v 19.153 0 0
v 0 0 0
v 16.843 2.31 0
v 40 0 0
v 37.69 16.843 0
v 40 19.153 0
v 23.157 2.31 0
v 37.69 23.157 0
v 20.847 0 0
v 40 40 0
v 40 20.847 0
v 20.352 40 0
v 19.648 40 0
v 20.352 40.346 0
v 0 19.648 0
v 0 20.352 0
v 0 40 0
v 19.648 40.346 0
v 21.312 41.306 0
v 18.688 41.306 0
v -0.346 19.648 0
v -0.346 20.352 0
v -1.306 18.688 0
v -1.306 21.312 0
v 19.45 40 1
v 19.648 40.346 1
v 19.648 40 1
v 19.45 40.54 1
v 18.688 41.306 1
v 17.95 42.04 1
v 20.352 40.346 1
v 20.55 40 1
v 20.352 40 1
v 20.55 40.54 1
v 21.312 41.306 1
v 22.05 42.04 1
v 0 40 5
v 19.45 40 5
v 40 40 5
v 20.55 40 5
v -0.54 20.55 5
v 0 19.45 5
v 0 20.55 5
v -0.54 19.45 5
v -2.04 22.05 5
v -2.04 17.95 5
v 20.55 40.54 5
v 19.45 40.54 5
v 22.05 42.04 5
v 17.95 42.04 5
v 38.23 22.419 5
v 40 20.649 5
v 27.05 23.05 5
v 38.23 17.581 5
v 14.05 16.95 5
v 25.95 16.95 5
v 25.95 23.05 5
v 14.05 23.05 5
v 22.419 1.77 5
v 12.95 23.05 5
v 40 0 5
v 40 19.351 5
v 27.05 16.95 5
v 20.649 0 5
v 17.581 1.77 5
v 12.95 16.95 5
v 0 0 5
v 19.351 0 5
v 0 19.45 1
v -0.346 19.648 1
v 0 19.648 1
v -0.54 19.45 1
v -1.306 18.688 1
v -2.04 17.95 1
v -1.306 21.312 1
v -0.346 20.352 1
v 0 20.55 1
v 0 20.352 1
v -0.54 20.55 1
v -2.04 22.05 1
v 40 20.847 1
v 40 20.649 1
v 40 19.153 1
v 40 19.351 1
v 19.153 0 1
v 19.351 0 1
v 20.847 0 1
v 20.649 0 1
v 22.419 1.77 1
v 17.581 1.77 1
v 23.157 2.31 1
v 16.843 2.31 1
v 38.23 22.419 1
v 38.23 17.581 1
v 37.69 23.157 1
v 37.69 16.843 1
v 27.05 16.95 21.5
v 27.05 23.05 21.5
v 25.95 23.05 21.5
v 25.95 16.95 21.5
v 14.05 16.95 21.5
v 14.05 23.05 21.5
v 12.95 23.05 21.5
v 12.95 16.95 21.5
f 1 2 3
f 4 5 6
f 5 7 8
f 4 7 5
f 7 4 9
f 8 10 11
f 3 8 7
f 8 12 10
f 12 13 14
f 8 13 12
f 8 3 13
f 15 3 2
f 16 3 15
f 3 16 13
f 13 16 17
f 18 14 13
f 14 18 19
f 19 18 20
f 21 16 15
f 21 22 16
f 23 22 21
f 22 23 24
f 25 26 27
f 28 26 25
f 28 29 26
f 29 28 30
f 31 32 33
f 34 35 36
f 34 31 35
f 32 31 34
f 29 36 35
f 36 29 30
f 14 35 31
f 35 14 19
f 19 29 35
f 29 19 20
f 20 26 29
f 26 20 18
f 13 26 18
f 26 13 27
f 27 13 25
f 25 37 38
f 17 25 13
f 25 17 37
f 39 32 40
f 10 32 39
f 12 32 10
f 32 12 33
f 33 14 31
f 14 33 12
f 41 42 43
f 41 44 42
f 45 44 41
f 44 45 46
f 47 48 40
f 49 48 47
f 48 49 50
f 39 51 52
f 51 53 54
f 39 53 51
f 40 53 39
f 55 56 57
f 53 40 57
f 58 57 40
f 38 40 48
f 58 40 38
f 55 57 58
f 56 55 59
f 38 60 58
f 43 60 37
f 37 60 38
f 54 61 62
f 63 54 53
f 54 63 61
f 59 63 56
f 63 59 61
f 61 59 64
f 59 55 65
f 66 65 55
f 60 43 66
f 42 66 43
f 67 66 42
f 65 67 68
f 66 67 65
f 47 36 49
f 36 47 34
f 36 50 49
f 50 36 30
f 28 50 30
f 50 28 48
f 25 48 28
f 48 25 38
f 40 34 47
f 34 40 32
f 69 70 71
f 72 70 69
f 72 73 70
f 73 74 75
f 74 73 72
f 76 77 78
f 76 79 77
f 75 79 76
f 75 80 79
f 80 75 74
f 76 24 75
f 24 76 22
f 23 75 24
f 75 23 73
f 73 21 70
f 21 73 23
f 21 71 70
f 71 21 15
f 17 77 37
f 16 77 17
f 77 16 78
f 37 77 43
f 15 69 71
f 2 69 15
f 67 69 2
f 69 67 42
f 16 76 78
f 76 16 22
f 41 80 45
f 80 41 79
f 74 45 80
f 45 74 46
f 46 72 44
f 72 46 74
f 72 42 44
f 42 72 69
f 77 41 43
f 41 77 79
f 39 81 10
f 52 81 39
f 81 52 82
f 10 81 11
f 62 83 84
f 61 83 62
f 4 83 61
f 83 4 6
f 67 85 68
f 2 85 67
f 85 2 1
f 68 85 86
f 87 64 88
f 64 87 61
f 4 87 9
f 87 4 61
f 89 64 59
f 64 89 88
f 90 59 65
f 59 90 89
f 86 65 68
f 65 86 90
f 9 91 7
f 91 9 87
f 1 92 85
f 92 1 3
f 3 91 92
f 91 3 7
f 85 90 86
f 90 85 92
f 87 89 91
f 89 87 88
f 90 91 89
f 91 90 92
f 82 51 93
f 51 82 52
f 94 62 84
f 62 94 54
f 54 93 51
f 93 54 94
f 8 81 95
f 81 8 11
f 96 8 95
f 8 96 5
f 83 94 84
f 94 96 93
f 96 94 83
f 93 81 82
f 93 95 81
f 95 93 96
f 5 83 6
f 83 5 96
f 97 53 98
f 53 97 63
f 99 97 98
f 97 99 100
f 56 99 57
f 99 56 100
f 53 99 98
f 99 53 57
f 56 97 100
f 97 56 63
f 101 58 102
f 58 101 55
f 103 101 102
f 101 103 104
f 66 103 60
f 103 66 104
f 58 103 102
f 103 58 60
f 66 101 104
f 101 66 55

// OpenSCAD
// file: interlockingmodule.scad
//this section defines a module for creating a "rounded" bottom to the box, useful when storing small parts
module RoundBottom(width, length, height){    
    translate([0,length,0])rotate([90,0,0])
    linear_extrude(length, center=false)
    
    difference() {
        translate([-width/2,0,0])square([width,height/2],center=false);
        translate([0,height/2,0])resize([width,height]) circle(d=width*10);
    }
}


module interlockingbox(
    //Box Width in units
    BoxWidthUnits = 3,
    //Box Length in units
    BoxLengthUnits = 3,
    //Box Height in mm
    BoxHeight = 120,
    //Box Floor Thickness in mm
    BoxFloor = 2,
    //North Wall open or closed
    NorthWallOpen = 0, // [0:Closed, 1:Open]
    //South Wall open or closed
    SouthWallOpen = 0 // [0:Closed, 1:Open]
)
{
echo(version=version(2.0));
//comments: Version 2 adds anti-"elephant foot" scaling at bottom of dovetail sections
/* [Size] */
//Box unit size in mm. This defines the size of 1 'unit' for your box.
BoxUnits = 40;
BoxWidth = BoxWidthUnits * BoxUnits;
BoxLength = BoxLengthUnits * BoxUnits;
//Box Wall Thickness in mm
BoxWall = 1;
//Fit Factor. Greater factor = looser fit
FitFactor = 0.18;  // [0:0.05:0.4]
//RoundedBottom = "EW"; // [EW:East-West, NS:North-South]
RoundedBottom = ""; // [EW:East-West, NS:North-South]

/* [Walls] */

/* [Dovetail] */
//Dovetail inside length in mm
DTInsideLength = 1.1;
//Dovetail angle in degrees
DTAngle = 45;
//Dovetail width in mm
DTWidth = 1.5;

/* [Hidden] */
//This helps calculate the length of the 'long' side of the dovetail
DTx=tan(DTAngle)*DTWidth;
//This polygon defines the dovetail shape
DTShape = [[0,0],[DTInsideLength/2,0],[DTInsideLength/2+DTx,DTWidth],[-DTInsideLength/2-DTx,DTWidth],[-DTInsideLength/2,0]];



union(){
    //creates and transforms rounded bottom
    if (RoundedBottom=="EW") {
    translate([0,(BoxWidth/2)+BoxWall,BoxFloor])
    rotate([0,0,-90])
    RoundBottom(BoxWidth-DTWidth-(BoxWall),BoxLength-DTWidth-BoxWall,2*(BoxHeight-BoxFloor));
    }

    //creates rounded bottom oriented North-South
    if (RoundedBottom=="NS") {
    translate([(BoxLength/2)-BoxWall,DTWidth+BoxWall/2,BoxFloor])
    rotate([0,0,0])
    RoundBottom(BoxLength-DTWidth-(BoxWall),BoxWidth-DTWidth-BoxWall,2*(BoxHeight-BoxFloor));
    }

    //Creates main box,without round bottom
    difference(){
        
    union(){
        //main box
    cube([BoxLength,BoxWidth,BoxHeight], center=false);

        //male dovetails
    for (i=[1:BoxLengthUnits])
    translate([(i-1)*BoxUnits+(BoxUnits/2),BoxWidth,0])
        //in 2 sections. first section is slightly scaled down to counter "elephant foot"
        union(){
            linear_extrude(height=1, center=false)
                scale([1-(2*FitFactor),1-(2*FitFactor),1])
                union(){        
                    //this adds a slight offset to the male dovetail for a looser fit
                    translate([-DTInsideLength/2,0,0])
                    square([DTInsideLength,DTWidth]);
                    //main dovetail shape
                    translate([0,DTWidth*FitFactor*2,0])
                    polygon(DTShape);
                };
            translate([0,0,1])
            linear_extrude(height=BoxHeight-1, center=false)
                    union(){
                    //this adds a slight offset to the male dovetail for a looser fit
                    translate([-DTInsideLength/2,0,0])
                    square([DTInsideLength,DTWidth]);
                    //main dovetail shape
                    translate([0,DTWidth*FitFactor*2,0])
                    polygon(DTShape);
                    };
        }        

    for (i=[1:BoxWidthUnits])
    translate([0,(i-1)*BoxUnits+(BoxUnits/2),0])
        //in 2 sections. first section is slightly scaled down to counter "elephant foot"
        rotate([0,0,90])
        union(){
            linear_extrude(height=1, center=false)				//1mm high anti-elephant foot section
                scale([1-(2*FitFactor),1-(2*FitFactor),1])
                union(){        
                    //this adds a slight offset to the male dovetail for a looser fit
                    translate([-DTInsideLength/2,0,0])
                    square([DTInsideLength,DTWidth]);
                    //main dovetail shape
                    translate([0,DTWidth*FitFactor*2,0])
                    polygon(DTShape);
                };
            translate([0,0,1])
            linear_extrude(height=BoxHeight-1, center=false)
                union(){
                    //male dovetail offset
                    translate([-DTInsideLength/2,0,0])
                    square([DTInsideLength,DTWidth]);
                    //main dovetail shape
                    translate([0,DTWidth*FitFactor*2,0])
                    polygon(DTShape);
                };
        }
    }
    //female dovetails
    for (i=[1:BoxLengthUnits])
        union(){
            translate([(i-1)*BoxUnits+(BoxUnits/2),0,0])
                scale([1+FitFactor,1+FitFactor,1])
                linear_extrude(height=BoxHeight, center=false)
                polygon(DTShape);
        
            //added a second dovetail cutout at the bottom, scaled up to counter "elephant foot" when printed
            translate([(i-1)*BoxUnits+(BoxUnits/2),0,0])
                scale([1+(3*FitFactor),1+(3*FitFactor),1])
                linear_extrude(height=1, center=false)
                polygon(DTShape);					
        }

    for (i=[1:BoxWidthUnits])
        union(){
            translate([BoxLength,(i-1)*BoxUnits+(BoxUnits/2),0])
                rotate([0,0,90])
                    scale([1+FitFactor,1+FitFactor,1])
                        linear_extrude(height=BoxHeight, center=false)
                            polygon(DTShape);
            //added a second dovetail cutout at the bottom, scaled up to counter "elephant foot" when printed
            translate([BoxLength,(i-1)*BoxUnits+(BoxUnits/2),0])
                rotate([0,0,90])
                    scale([1+(3*FitFactor),1+(3*FitFactor),1])
                        linear_extrude(height=1, center=false)
                            polygon(DTShape);	
        }
    //carves out main box
    translate([BoxWall,DTWidth+BoxWall,BoxFloor])
        cube([BoxLength-(2*BoxWall)-DTWidth, (BoxWidth-(2*BoxWall)-DTWidth), BoxHeight]);

    if (NorthWallOpen)
        translate([-DTWidth*(1+FitFactor+FitFactor),BoxWall+DTWidth,BoxFloor])
            cube([BoxWall+(DTWidth*(1+FitFactor+FitFactor)), (BoxWidth-(2*BoxWall)-DTWidth), BoxHeight]);    

    if (SouthWallOpen)
        translate([BoxLength-(BoxWall)-DTWidth,BoxWall+DTWidth,BoxFloor])
            cube([BoxWall+DTWidth, (BoxWidth-(2*BoxWall)-DTWidth), BoxHeight]);

    }
  }
}

// Cutout to make sure the actual box with groves is properly printed
// Use this with difference() to remove trim internal to fit the box.
module negativeBox(
    //Box Width in units
    BoxWidthUnits = 3,
    //Box Length in units
    BoxLengthUnits = 3,
    //Box Height in mm
    BoxHeight = 120,
    //Box unit size in mm. This defines the size of 1 'unit' for your box.
    BoxUnits = 40,
)
{
    difference () {
        translate([-5,-3,0])
        cube([BoxLengthUnits*BoxUnits+8,BoxWidthUnits*BoxUnits+8,BoxHeight]);

    translate([0.5,2,0])
        cube([BoxLengthUnits*BoxUnits-2.5,BoxWidthUnits*BoxUnits-2.5,BoxHeight]);
    }
}

interlockingbox(2,3,40);

// This will create a sliver of a wall if working properly
//difference() {
//    interlockingbox(2,3,40);
//    negativeBox(2,3,40);
//}
// main file
use <interlockingmodule.scad>

$fn=360;

height=5;

BoxUnits=40;
BoxWidthUnits=1;
BoxLengthUnits=1;

interlockingbox(BoxWidthUnits,BoxLengthUnits,height,height+0.01);

difference() {
    union() {
    for (x=[BoxUnits/2:BoxUnits:BoxUnits*BoxLengthUnits])
        for (y=[BoxUnits/2:BoxUnits:BoxUnits*BoxWidthUnits])
            translate([x,y,height/2]) acplug(BoxUnits,BoxUnits,height);
    }
}

module acplug(x=38,y=38,z=5) {
  overextrusion = 0.2;
  pin_thickness = 1.5 - 2 * overextrusion;
  pin_width = 6.5 - 2 * overextrusion;
  pin_length = 16.5;
  translate([6.5,0,z/2+pin_length/2])
    cube([pin_thickness,pin_width,pin_length],center=true);
  translate([-6.5,0,z/2+pin_length/2])
    cube([pin_thickness,pin_width,pin_length],center=true);
}
